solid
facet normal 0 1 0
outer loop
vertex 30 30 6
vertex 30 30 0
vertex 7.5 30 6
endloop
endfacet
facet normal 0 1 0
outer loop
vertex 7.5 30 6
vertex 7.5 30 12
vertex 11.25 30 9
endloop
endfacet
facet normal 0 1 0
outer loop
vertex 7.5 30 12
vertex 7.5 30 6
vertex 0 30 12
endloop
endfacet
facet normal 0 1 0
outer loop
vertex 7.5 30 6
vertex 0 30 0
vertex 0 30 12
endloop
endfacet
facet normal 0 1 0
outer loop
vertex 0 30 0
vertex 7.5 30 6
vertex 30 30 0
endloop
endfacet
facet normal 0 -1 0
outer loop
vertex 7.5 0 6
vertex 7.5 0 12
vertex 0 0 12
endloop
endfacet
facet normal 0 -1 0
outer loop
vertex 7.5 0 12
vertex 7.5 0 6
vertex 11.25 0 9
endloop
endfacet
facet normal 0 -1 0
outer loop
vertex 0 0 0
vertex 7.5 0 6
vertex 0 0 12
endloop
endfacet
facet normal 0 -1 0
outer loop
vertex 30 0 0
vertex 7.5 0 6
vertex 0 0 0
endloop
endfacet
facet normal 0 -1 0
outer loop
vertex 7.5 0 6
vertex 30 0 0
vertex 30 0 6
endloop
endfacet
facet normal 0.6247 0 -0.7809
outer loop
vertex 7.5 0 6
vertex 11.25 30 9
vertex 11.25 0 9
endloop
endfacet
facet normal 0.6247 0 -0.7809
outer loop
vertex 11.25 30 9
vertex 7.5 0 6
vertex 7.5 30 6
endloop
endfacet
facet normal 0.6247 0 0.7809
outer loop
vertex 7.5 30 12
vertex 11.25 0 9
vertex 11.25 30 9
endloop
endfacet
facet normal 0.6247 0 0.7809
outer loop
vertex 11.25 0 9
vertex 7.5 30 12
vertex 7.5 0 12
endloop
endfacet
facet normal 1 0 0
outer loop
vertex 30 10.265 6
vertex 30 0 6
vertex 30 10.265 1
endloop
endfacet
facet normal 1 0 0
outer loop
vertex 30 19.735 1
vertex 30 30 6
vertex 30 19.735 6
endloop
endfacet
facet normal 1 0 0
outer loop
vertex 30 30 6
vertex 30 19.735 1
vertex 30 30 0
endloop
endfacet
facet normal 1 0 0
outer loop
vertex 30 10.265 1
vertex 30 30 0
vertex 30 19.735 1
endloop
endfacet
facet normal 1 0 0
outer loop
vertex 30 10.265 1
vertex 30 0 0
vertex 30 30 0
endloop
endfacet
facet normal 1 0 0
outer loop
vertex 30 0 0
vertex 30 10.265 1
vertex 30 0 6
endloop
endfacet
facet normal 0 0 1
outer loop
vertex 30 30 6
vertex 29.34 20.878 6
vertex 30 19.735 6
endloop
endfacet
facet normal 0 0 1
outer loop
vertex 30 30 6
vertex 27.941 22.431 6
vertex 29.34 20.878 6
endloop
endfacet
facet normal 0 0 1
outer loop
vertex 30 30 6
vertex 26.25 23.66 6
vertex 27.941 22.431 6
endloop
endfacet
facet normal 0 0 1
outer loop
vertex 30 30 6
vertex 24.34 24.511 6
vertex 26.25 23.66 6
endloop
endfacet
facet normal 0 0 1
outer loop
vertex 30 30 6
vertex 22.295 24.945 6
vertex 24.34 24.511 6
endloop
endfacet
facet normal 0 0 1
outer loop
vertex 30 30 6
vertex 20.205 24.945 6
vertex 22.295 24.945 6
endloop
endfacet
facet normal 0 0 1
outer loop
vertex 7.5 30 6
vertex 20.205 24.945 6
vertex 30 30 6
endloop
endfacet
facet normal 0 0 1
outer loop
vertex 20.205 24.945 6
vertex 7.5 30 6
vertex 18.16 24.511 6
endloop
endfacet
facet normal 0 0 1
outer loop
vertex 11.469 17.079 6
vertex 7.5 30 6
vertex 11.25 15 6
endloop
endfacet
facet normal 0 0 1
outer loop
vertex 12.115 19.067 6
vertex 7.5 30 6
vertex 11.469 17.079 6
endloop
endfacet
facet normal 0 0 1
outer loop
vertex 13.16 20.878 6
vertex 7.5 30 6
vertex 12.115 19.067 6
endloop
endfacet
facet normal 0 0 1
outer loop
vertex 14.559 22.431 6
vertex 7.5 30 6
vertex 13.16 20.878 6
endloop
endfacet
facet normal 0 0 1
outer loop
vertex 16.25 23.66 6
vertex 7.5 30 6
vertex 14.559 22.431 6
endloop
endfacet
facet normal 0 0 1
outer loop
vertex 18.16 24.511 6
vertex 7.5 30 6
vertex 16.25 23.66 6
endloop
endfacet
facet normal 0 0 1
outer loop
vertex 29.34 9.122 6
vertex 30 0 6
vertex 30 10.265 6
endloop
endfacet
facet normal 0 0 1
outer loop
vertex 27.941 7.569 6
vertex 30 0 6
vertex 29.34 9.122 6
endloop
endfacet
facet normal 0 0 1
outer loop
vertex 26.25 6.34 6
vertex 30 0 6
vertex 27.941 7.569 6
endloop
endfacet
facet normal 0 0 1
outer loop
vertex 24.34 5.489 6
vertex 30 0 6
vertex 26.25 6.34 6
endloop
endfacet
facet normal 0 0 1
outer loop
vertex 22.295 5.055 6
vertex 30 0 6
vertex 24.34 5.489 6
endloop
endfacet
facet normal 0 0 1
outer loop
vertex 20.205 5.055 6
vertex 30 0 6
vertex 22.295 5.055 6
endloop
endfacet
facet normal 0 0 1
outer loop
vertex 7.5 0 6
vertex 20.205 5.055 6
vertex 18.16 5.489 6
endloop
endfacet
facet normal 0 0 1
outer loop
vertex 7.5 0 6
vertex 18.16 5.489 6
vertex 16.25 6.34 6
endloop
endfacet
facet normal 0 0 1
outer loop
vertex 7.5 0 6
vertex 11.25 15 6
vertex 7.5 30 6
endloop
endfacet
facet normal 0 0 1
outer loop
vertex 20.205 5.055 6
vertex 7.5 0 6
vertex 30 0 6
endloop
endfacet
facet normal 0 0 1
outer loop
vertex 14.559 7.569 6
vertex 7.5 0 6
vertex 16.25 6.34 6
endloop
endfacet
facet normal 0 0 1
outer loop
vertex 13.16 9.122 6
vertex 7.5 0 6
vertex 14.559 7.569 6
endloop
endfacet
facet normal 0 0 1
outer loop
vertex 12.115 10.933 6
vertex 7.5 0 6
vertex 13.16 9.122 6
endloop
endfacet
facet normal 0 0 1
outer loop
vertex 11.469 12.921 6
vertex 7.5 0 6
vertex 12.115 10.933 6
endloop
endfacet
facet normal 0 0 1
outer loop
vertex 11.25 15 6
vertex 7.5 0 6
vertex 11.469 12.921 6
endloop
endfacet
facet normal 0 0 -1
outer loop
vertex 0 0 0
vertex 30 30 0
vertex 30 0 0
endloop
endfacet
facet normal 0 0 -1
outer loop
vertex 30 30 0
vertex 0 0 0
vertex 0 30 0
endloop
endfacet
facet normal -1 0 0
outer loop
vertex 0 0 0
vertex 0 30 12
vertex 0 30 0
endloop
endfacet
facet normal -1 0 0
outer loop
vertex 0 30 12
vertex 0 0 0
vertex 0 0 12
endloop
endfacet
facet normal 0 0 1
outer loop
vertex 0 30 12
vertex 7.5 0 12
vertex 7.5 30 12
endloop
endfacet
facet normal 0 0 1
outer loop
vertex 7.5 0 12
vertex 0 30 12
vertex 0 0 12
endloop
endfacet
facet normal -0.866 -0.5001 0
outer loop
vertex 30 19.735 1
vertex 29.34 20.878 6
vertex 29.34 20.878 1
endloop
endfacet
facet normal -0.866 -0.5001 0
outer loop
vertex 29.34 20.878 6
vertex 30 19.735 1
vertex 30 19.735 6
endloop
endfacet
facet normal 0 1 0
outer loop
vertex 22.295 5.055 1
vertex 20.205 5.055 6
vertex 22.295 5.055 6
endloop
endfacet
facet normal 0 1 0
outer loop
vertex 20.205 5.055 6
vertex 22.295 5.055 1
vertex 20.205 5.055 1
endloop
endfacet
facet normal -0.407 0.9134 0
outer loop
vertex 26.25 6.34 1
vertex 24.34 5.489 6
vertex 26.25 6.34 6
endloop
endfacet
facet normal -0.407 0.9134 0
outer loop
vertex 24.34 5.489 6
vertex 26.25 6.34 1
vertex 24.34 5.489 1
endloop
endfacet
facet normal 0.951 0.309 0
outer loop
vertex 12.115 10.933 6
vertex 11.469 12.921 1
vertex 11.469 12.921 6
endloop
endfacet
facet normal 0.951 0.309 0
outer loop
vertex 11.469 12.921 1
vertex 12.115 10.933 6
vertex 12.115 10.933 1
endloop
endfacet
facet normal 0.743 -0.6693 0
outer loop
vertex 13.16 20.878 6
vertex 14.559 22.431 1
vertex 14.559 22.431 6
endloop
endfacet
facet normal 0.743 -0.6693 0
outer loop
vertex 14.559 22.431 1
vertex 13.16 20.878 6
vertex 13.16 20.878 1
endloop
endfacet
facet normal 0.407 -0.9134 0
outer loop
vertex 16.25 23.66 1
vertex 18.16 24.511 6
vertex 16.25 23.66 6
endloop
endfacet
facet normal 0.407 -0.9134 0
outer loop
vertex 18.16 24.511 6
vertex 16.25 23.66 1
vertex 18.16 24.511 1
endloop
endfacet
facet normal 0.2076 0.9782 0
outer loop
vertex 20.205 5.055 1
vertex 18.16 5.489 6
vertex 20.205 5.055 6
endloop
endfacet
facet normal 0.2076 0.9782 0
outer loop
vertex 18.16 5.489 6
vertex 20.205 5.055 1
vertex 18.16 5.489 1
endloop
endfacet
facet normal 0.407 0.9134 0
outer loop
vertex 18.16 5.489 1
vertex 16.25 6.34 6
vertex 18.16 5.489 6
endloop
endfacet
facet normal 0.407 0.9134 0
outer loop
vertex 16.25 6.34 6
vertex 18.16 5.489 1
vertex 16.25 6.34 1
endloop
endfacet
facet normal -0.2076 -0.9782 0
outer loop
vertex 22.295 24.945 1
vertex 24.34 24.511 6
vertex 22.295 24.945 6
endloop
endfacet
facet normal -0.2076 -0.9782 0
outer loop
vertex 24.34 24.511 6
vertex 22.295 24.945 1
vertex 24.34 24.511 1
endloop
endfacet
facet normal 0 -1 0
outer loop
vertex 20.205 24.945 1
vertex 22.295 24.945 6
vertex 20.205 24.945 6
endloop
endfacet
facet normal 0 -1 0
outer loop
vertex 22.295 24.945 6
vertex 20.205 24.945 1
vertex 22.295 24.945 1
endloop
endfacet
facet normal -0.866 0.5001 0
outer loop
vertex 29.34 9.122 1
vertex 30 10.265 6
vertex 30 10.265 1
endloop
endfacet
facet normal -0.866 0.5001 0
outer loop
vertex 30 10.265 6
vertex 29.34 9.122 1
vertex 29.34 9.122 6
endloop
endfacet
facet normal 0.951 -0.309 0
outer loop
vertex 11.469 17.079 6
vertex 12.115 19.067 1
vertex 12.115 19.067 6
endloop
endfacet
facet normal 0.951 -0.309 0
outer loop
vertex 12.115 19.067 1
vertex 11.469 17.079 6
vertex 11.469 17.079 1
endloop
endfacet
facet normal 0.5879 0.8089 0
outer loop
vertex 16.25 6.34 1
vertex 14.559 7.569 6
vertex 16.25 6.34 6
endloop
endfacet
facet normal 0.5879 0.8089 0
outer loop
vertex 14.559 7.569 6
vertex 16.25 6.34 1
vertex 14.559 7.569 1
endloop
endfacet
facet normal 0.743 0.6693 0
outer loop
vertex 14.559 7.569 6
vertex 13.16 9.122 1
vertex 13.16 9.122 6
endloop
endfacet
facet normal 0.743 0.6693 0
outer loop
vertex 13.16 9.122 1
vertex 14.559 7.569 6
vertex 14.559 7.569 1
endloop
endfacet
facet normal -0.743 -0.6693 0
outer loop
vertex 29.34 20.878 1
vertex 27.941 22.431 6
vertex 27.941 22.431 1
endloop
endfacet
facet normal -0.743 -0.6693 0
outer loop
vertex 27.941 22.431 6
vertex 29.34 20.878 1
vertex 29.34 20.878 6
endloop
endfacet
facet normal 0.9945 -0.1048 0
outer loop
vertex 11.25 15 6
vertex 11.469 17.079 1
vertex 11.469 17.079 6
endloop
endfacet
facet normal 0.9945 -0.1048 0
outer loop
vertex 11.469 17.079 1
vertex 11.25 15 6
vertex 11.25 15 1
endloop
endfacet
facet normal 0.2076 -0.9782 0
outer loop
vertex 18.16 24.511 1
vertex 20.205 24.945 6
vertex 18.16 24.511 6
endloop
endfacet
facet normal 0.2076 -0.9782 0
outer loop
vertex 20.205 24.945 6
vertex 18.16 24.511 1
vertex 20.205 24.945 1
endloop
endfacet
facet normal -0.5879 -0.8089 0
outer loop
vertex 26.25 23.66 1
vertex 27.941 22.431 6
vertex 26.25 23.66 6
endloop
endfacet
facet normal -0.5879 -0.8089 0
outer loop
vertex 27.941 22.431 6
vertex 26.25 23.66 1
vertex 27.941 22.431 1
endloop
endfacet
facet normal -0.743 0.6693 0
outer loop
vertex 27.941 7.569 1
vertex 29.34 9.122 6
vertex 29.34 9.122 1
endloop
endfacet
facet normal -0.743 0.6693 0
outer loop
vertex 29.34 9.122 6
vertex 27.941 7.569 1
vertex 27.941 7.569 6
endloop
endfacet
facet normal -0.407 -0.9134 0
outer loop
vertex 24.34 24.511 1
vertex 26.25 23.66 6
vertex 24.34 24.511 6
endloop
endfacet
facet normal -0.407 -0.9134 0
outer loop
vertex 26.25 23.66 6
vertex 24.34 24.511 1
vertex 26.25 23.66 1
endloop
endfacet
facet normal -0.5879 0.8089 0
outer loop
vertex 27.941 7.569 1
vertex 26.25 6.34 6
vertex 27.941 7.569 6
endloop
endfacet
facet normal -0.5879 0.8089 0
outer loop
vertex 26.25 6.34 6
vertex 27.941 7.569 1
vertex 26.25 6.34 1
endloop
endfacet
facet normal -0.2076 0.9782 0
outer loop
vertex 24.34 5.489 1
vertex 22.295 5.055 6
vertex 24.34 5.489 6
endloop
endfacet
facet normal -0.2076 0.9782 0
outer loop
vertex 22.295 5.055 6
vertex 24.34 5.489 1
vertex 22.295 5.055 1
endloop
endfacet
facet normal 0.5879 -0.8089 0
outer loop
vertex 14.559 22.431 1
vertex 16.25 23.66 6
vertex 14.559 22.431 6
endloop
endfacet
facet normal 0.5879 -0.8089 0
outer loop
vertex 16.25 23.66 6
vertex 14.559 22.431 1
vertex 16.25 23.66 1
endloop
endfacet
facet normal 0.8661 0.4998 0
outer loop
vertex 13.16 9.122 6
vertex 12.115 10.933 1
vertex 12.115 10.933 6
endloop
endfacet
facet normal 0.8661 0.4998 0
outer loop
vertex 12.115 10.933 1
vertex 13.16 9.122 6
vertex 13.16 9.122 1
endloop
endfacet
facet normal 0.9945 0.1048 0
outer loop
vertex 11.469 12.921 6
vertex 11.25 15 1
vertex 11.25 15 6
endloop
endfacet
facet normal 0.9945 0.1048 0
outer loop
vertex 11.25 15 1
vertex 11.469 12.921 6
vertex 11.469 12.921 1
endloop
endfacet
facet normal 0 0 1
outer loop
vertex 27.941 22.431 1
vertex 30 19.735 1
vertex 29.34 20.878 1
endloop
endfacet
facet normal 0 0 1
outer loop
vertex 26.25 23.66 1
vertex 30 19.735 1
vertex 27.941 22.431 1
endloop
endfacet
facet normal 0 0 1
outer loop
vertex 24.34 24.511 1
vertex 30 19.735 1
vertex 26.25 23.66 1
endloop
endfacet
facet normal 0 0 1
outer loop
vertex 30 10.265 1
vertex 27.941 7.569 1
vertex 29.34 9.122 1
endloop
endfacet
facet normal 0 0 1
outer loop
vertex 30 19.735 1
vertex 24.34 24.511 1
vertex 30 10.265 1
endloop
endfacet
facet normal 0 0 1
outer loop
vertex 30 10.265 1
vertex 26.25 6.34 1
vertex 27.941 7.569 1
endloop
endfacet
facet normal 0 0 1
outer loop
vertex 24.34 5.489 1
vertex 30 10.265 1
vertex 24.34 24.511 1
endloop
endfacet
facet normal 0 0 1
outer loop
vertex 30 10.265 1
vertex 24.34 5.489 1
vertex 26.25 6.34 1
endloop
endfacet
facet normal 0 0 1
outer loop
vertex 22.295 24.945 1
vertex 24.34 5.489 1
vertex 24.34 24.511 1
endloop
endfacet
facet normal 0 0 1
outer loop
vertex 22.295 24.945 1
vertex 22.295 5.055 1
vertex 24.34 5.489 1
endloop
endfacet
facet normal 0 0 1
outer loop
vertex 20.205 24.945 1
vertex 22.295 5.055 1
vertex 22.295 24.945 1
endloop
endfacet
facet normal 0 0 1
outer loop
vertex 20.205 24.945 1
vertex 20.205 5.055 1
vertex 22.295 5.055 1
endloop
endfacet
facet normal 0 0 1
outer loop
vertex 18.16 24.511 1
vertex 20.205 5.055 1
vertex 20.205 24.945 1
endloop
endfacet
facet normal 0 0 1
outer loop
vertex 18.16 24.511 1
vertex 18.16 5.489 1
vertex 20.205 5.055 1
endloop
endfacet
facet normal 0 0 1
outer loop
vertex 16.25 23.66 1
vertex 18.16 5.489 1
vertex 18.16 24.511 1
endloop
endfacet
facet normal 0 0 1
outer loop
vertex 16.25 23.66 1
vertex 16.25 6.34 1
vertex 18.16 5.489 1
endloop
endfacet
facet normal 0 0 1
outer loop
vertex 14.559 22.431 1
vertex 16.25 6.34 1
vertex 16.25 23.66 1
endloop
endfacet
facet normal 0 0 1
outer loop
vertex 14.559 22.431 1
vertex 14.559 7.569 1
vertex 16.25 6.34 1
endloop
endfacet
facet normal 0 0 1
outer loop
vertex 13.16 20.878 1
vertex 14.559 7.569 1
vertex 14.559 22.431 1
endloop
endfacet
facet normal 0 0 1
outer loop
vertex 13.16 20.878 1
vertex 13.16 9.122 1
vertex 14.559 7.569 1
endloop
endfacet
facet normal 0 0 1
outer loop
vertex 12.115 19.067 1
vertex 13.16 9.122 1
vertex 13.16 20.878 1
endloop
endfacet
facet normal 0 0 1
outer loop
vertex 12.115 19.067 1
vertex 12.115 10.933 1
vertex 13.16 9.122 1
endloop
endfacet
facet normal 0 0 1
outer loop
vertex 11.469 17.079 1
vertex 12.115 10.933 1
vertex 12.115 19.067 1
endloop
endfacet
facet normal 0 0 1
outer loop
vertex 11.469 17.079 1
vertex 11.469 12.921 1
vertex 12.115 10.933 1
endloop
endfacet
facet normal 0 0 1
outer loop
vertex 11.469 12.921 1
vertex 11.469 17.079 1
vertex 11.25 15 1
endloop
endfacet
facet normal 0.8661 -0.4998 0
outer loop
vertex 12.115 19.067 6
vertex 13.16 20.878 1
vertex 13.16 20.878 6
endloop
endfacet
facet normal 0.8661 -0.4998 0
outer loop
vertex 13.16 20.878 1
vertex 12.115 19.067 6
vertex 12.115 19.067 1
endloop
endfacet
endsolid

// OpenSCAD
translate([0.0,0.0,0.0])  scale([1.0,1.0,1.0])  difference()  {
union()  {
cube([30.0,30.0,6.0]);
translate([0.0,0.0,6.0])  cube([7.5,30.0,6.0]);
translate([7.5,0.0,6.0])  difference()  {
cube([3.75,30.0,6.0]);
rotate([0.0,51.340191745909905,0.0])  cube([4.802343178074636,30.0,4.802343178074636]);
translate([0.0,0.0,6.0])  rotate([0.0,38.659808254090095,0.0])  cube([4.802343178074636,30.0,4.802343178074636]);
}
}
translate([21.25,15.0,1.0])  cylinder(r=10.0,h=5.0);
}
